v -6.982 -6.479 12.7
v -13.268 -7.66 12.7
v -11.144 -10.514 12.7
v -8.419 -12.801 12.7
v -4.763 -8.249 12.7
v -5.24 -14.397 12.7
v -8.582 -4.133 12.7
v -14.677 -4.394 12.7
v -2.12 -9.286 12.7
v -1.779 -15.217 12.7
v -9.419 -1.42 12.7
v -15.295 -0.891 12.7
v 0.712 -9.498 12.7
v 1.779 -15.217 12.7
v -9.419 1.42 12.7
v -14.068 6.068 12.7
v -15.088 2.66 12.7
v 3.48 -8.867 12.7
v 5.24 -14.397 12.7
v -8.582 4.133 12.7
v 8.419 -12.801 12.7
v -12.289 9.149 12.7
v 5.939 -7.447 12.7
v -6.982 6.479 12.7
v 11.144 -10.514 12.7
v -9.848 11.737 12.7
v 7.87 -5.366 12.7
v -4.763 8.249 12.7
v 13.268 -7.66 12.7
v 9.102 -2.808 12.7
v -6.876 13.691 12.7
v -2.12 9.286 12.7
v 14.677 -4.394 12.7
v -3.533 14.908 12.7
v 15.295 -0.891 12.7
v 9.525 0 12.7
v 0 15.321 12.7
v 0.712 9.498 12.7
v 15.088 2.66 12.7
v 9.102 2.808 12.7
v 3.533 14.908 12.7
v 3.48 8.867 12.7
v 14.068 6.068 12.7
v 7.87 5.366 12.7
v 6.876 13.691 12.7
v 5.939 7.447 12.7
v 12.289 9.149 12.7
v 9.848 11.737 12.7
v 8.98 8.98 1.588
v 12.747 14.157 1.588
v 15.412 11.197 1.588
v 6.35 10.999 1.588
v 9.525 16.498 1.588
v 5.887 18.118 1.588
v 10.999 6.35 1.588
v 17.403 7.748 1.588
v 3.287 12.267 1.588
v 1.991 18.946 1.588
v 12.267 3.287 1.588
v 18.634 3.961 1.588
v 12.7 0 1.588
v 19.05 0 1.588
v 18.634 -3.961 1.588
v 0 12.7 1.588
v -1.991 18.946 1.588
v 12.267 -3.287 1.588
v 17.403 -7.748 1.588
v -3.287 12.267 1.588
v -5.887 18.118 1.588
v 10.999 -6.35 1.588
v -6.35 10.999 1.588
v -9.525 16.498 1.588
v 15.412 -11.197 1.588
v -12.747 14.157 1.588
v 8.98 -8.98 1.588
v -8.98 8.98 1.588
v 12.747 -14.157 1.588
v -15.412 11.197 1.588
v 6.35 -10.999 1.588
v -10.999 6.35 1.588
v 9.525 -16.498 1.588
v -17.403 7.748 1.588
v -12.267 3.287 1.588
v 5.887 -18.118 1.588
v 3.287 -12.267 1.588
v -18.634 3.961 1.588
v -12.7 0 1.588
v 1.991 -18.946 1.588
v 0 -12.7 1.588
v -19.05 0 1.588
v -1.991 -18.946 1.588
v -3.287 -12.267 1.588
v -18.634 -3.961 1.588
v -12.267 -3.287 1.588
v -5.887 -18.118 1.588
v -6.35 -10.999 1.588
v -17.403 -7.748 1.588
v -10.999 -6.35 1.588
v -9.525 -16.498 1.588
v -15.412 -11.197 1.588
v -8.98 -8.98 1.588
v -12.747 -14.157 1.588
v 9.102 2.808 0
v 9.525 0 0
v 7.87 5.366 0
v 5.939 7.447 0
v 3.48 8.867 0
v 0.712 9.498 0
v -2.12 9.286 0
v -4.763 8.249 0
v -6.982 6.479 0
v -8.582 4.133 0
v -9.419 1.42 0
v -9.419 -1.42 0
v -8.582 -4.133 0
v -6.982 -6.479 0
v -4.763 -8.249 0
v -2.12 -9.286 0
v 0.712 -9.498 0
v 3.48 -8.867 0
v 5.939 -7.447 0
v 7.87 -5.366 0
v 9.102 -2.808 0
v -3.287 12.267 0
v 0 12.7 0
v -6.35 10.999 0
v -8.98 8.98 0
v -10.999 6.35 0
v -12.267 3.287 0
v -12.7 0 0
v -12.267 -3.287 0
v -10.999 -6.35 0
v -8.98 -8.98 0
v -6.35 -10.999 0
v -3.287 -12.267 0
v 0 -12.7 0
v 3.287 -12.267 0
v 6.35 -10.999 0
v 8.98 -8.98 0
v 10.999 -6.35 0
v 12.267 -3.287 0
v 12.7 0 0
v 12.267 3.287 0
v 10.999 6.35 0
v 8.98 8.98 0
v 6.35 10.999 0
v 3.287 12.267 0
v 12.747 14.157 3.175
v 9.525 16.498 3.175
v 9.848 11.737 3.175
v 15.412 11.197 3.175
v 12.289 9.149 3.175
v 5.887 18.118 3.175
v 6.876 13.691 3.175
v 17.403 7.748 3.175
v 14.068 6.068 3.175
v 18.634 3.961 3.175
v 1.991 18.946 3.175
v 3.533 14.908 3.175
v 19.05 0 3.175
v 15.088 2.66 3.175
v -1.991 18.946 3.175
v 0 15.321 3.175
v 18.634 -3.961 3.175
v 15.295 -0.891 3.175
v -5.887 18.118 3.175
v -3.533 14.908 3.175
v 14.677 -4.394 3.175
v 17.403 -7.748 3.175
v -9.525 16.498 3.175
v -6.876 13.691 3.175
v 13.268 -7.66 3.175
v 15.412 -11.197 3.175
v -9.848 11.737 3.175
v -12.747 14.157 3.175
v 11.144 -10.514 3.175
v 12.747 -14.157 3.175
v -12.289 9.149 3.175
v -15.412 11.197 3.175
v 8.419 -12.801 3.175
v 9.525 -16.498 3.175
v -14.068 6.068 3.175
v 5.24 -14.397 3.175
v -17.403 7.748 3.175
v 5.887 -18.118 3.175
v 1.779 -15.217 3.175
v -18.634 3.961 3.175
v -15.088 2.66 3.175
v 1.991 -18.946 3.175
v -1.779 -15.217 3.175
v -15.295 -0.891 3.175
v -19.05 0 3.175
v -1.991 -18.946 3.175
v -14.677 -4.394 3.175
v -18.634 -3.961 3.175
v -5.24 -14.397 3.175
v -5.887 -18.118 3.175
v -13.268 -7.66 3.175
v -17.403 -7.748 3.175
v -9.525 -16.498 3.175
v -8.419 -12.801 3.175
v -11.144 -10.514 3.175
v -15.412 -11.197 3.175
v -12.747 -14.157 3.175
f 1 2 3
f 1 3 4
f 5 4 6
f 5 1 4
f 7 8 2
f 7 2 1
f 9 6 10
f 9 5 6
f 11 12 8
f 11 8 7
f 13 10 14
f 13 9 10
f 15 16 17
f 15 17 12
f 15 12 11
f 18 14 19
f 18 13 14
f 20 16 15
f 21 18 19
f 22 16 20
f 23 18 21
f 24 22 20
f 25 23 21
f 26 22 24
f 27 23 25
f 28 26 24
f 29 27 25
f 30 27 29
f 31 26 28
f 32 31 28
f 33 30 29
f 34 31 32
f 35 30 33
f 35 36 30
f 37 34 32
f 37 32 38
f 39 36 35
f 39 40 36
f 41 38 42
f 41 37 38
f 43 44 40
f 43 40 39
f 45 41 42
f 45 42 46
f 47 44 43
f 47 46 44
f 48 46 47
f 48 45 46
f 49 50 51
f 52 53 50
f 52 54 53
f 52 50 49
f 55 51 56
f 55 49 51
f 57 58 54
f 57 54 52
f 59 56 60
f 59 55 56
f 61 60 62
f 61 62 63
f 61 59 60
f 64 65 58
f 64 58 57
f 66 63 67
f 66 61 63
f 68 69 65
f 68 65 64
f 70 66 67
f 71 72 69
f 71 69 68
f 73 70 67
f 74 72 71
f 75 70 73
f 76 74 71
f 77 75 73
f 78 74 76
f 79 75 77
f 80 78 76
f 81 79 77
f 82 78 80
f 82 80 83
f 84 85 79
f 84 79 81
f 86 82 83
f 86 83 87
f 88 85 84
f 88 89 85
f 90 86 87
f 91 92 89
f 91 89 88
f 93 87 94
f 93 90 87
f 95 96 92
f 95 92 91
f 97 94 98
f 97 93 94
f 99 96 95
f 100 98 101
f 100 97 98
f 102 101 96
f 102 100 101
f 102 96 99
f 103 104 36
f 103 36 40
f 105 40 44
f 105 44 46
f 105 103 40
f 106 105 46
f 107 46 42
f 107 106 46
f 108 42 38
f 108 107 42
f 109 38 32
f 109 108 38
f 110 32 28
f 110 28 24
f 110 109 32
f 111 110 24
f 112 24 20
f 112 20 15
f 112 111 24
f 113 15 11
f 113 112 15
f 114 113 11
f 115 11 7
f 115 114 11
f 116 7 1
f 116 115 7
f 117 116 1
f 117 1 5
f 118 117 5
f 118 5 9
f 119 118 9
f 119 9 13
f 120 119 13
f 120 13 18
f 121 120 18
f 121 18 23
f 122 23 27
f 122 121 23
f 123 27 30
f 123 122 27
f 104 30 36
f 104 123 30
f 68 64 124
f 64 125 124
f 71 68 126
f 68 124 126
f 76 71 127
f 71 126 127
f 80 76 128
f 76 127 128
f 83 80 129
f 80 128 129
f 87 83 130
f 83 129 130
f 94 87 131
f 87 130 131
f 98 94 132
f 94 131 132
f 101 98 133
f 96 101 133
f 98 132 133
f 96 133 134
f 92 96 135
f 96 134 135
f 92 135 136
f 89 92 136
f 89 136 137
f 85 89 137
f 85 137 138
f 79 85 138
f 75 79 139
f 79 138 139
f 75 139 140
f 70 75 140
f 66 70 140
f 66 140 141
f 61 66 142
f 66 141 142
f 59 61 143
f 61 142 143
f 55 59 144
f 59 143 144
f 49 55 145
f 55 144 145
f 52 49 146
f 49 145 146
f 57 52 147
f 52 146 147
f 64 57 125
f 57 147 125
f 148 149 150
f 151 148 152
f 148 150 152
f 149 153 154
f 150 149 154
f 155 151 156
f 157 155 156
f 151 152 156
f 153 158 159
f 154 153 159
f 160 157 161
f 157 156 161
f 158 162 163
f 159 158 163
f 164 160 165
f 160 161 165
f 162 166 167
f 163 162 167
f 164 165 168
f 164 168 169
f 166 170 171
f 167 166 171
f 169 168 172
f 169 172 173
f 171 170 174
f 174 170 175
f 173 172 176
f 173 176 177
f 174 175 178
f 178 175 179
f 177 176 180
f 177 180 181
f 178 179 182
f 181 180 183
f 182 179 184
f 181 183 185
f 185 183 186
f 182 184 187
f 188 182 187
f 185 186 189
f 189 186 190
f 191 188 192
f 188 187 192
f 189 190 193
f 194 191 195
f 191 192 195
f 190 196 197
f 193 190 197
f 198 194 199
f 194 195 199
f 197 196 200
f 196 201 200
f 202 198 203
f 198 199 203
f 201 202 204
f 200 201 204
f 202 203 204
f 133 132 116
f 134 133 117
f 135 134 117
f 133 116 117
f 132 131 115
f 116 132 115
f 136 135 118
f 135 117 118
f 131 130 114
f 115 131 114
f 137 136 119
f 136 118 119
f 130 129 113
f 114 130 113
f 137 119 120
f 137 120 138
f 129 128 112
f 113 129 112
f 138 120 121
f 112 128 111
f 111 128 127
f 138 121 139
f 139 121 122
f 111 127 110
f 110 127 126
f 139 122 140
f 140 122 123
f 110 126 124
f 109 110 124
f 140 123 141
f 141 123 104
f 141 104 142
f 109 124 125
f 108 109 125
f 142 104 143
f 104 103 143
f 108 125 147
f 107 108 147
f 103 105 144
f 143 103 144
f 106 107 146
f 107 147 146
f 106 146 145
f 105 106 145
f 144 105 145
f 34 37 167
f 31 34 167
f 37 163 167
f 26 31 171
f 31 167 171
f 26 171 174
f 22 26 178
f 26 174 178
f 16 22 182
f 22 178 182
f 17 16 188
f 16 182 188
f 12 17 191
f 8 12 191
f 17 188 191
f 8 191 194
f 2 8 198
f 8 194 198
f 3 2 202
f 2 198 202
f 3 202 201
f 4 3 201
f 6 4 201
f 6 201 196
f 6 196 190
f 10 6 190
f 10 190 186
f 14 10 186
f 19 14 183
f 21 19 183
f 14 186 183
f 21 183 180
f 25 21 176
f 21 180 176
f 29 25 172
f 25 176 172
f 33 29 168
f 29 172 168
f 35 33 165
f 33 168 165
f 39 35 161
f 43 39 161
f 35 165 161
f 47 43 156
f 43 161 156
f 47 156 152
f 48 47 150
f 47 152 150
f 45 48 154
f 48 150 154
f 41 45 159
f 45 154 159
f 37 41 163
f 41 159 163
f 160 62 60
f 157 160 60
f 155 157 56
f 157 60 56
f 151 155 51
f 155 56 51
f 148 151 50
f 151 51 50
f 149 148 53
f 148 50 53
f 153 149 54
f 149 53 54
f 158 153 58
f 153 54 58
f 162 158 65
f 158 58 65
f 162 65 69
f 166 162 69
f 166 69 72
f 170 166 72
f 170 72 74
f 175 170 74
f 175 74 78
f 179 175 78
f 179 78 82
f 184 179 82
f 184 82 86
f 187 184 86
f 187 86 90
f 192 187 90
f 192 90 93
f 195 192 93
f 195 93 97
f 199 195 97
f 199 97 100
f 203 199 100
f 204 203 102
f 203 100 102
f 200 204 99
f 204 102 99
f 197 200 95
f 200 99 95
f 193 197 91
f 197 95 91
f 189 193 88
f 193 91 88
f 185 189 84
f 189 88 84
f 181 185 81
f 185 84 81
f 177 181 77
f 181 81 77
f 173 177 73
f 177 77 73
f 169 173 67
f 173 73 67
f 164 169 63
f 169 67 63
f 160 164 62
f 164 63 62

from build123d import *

# Parameters (mm, degrees)
SKETCH1_R           = 19.05
SKETCH1_R_2         = 9.525
BOSS_EXTRUDE1_DEPTH = 12.7
SKETCH2_W           = 9.525
SKETCH2_H           = 3.729002221
SKETCH2_W_2         = 1.5875
SKETCH2_H_2         = 6.35


with BuildPart() as part:
    # Sketch1 → Boss-Extrude1 (new body)
    with BuildSketch(Plane.XY):
        Circle(SKETCH1_R)
        Circle(SKETCH1_R_2, mode=Mode.SUBTRACT)
    extrude(amount=BOSS_EXTRUDE1_DEPTH)

    # Sketch2 → Cut-Revolve1 (revolve, cut)
    with BuildSketch(Plane(origin=(0, 0, 0), x_dir=(0, 0, -1), z_dir=(1, 0, 0))):
        with Locations((-7.9375, 17.185498889)):
            Rectangle(SKETCH2_W, SKETCH2_H)
        with Locations((-0.79375, 15.875)):
            Rectangle(SKETCH2_W_2, SKETCH2_H_2)
    revolve(axis=Axis((0, 0, 0), (0, 0, 1)), mode=Mode.SUBTRACT)


solid = part.part
